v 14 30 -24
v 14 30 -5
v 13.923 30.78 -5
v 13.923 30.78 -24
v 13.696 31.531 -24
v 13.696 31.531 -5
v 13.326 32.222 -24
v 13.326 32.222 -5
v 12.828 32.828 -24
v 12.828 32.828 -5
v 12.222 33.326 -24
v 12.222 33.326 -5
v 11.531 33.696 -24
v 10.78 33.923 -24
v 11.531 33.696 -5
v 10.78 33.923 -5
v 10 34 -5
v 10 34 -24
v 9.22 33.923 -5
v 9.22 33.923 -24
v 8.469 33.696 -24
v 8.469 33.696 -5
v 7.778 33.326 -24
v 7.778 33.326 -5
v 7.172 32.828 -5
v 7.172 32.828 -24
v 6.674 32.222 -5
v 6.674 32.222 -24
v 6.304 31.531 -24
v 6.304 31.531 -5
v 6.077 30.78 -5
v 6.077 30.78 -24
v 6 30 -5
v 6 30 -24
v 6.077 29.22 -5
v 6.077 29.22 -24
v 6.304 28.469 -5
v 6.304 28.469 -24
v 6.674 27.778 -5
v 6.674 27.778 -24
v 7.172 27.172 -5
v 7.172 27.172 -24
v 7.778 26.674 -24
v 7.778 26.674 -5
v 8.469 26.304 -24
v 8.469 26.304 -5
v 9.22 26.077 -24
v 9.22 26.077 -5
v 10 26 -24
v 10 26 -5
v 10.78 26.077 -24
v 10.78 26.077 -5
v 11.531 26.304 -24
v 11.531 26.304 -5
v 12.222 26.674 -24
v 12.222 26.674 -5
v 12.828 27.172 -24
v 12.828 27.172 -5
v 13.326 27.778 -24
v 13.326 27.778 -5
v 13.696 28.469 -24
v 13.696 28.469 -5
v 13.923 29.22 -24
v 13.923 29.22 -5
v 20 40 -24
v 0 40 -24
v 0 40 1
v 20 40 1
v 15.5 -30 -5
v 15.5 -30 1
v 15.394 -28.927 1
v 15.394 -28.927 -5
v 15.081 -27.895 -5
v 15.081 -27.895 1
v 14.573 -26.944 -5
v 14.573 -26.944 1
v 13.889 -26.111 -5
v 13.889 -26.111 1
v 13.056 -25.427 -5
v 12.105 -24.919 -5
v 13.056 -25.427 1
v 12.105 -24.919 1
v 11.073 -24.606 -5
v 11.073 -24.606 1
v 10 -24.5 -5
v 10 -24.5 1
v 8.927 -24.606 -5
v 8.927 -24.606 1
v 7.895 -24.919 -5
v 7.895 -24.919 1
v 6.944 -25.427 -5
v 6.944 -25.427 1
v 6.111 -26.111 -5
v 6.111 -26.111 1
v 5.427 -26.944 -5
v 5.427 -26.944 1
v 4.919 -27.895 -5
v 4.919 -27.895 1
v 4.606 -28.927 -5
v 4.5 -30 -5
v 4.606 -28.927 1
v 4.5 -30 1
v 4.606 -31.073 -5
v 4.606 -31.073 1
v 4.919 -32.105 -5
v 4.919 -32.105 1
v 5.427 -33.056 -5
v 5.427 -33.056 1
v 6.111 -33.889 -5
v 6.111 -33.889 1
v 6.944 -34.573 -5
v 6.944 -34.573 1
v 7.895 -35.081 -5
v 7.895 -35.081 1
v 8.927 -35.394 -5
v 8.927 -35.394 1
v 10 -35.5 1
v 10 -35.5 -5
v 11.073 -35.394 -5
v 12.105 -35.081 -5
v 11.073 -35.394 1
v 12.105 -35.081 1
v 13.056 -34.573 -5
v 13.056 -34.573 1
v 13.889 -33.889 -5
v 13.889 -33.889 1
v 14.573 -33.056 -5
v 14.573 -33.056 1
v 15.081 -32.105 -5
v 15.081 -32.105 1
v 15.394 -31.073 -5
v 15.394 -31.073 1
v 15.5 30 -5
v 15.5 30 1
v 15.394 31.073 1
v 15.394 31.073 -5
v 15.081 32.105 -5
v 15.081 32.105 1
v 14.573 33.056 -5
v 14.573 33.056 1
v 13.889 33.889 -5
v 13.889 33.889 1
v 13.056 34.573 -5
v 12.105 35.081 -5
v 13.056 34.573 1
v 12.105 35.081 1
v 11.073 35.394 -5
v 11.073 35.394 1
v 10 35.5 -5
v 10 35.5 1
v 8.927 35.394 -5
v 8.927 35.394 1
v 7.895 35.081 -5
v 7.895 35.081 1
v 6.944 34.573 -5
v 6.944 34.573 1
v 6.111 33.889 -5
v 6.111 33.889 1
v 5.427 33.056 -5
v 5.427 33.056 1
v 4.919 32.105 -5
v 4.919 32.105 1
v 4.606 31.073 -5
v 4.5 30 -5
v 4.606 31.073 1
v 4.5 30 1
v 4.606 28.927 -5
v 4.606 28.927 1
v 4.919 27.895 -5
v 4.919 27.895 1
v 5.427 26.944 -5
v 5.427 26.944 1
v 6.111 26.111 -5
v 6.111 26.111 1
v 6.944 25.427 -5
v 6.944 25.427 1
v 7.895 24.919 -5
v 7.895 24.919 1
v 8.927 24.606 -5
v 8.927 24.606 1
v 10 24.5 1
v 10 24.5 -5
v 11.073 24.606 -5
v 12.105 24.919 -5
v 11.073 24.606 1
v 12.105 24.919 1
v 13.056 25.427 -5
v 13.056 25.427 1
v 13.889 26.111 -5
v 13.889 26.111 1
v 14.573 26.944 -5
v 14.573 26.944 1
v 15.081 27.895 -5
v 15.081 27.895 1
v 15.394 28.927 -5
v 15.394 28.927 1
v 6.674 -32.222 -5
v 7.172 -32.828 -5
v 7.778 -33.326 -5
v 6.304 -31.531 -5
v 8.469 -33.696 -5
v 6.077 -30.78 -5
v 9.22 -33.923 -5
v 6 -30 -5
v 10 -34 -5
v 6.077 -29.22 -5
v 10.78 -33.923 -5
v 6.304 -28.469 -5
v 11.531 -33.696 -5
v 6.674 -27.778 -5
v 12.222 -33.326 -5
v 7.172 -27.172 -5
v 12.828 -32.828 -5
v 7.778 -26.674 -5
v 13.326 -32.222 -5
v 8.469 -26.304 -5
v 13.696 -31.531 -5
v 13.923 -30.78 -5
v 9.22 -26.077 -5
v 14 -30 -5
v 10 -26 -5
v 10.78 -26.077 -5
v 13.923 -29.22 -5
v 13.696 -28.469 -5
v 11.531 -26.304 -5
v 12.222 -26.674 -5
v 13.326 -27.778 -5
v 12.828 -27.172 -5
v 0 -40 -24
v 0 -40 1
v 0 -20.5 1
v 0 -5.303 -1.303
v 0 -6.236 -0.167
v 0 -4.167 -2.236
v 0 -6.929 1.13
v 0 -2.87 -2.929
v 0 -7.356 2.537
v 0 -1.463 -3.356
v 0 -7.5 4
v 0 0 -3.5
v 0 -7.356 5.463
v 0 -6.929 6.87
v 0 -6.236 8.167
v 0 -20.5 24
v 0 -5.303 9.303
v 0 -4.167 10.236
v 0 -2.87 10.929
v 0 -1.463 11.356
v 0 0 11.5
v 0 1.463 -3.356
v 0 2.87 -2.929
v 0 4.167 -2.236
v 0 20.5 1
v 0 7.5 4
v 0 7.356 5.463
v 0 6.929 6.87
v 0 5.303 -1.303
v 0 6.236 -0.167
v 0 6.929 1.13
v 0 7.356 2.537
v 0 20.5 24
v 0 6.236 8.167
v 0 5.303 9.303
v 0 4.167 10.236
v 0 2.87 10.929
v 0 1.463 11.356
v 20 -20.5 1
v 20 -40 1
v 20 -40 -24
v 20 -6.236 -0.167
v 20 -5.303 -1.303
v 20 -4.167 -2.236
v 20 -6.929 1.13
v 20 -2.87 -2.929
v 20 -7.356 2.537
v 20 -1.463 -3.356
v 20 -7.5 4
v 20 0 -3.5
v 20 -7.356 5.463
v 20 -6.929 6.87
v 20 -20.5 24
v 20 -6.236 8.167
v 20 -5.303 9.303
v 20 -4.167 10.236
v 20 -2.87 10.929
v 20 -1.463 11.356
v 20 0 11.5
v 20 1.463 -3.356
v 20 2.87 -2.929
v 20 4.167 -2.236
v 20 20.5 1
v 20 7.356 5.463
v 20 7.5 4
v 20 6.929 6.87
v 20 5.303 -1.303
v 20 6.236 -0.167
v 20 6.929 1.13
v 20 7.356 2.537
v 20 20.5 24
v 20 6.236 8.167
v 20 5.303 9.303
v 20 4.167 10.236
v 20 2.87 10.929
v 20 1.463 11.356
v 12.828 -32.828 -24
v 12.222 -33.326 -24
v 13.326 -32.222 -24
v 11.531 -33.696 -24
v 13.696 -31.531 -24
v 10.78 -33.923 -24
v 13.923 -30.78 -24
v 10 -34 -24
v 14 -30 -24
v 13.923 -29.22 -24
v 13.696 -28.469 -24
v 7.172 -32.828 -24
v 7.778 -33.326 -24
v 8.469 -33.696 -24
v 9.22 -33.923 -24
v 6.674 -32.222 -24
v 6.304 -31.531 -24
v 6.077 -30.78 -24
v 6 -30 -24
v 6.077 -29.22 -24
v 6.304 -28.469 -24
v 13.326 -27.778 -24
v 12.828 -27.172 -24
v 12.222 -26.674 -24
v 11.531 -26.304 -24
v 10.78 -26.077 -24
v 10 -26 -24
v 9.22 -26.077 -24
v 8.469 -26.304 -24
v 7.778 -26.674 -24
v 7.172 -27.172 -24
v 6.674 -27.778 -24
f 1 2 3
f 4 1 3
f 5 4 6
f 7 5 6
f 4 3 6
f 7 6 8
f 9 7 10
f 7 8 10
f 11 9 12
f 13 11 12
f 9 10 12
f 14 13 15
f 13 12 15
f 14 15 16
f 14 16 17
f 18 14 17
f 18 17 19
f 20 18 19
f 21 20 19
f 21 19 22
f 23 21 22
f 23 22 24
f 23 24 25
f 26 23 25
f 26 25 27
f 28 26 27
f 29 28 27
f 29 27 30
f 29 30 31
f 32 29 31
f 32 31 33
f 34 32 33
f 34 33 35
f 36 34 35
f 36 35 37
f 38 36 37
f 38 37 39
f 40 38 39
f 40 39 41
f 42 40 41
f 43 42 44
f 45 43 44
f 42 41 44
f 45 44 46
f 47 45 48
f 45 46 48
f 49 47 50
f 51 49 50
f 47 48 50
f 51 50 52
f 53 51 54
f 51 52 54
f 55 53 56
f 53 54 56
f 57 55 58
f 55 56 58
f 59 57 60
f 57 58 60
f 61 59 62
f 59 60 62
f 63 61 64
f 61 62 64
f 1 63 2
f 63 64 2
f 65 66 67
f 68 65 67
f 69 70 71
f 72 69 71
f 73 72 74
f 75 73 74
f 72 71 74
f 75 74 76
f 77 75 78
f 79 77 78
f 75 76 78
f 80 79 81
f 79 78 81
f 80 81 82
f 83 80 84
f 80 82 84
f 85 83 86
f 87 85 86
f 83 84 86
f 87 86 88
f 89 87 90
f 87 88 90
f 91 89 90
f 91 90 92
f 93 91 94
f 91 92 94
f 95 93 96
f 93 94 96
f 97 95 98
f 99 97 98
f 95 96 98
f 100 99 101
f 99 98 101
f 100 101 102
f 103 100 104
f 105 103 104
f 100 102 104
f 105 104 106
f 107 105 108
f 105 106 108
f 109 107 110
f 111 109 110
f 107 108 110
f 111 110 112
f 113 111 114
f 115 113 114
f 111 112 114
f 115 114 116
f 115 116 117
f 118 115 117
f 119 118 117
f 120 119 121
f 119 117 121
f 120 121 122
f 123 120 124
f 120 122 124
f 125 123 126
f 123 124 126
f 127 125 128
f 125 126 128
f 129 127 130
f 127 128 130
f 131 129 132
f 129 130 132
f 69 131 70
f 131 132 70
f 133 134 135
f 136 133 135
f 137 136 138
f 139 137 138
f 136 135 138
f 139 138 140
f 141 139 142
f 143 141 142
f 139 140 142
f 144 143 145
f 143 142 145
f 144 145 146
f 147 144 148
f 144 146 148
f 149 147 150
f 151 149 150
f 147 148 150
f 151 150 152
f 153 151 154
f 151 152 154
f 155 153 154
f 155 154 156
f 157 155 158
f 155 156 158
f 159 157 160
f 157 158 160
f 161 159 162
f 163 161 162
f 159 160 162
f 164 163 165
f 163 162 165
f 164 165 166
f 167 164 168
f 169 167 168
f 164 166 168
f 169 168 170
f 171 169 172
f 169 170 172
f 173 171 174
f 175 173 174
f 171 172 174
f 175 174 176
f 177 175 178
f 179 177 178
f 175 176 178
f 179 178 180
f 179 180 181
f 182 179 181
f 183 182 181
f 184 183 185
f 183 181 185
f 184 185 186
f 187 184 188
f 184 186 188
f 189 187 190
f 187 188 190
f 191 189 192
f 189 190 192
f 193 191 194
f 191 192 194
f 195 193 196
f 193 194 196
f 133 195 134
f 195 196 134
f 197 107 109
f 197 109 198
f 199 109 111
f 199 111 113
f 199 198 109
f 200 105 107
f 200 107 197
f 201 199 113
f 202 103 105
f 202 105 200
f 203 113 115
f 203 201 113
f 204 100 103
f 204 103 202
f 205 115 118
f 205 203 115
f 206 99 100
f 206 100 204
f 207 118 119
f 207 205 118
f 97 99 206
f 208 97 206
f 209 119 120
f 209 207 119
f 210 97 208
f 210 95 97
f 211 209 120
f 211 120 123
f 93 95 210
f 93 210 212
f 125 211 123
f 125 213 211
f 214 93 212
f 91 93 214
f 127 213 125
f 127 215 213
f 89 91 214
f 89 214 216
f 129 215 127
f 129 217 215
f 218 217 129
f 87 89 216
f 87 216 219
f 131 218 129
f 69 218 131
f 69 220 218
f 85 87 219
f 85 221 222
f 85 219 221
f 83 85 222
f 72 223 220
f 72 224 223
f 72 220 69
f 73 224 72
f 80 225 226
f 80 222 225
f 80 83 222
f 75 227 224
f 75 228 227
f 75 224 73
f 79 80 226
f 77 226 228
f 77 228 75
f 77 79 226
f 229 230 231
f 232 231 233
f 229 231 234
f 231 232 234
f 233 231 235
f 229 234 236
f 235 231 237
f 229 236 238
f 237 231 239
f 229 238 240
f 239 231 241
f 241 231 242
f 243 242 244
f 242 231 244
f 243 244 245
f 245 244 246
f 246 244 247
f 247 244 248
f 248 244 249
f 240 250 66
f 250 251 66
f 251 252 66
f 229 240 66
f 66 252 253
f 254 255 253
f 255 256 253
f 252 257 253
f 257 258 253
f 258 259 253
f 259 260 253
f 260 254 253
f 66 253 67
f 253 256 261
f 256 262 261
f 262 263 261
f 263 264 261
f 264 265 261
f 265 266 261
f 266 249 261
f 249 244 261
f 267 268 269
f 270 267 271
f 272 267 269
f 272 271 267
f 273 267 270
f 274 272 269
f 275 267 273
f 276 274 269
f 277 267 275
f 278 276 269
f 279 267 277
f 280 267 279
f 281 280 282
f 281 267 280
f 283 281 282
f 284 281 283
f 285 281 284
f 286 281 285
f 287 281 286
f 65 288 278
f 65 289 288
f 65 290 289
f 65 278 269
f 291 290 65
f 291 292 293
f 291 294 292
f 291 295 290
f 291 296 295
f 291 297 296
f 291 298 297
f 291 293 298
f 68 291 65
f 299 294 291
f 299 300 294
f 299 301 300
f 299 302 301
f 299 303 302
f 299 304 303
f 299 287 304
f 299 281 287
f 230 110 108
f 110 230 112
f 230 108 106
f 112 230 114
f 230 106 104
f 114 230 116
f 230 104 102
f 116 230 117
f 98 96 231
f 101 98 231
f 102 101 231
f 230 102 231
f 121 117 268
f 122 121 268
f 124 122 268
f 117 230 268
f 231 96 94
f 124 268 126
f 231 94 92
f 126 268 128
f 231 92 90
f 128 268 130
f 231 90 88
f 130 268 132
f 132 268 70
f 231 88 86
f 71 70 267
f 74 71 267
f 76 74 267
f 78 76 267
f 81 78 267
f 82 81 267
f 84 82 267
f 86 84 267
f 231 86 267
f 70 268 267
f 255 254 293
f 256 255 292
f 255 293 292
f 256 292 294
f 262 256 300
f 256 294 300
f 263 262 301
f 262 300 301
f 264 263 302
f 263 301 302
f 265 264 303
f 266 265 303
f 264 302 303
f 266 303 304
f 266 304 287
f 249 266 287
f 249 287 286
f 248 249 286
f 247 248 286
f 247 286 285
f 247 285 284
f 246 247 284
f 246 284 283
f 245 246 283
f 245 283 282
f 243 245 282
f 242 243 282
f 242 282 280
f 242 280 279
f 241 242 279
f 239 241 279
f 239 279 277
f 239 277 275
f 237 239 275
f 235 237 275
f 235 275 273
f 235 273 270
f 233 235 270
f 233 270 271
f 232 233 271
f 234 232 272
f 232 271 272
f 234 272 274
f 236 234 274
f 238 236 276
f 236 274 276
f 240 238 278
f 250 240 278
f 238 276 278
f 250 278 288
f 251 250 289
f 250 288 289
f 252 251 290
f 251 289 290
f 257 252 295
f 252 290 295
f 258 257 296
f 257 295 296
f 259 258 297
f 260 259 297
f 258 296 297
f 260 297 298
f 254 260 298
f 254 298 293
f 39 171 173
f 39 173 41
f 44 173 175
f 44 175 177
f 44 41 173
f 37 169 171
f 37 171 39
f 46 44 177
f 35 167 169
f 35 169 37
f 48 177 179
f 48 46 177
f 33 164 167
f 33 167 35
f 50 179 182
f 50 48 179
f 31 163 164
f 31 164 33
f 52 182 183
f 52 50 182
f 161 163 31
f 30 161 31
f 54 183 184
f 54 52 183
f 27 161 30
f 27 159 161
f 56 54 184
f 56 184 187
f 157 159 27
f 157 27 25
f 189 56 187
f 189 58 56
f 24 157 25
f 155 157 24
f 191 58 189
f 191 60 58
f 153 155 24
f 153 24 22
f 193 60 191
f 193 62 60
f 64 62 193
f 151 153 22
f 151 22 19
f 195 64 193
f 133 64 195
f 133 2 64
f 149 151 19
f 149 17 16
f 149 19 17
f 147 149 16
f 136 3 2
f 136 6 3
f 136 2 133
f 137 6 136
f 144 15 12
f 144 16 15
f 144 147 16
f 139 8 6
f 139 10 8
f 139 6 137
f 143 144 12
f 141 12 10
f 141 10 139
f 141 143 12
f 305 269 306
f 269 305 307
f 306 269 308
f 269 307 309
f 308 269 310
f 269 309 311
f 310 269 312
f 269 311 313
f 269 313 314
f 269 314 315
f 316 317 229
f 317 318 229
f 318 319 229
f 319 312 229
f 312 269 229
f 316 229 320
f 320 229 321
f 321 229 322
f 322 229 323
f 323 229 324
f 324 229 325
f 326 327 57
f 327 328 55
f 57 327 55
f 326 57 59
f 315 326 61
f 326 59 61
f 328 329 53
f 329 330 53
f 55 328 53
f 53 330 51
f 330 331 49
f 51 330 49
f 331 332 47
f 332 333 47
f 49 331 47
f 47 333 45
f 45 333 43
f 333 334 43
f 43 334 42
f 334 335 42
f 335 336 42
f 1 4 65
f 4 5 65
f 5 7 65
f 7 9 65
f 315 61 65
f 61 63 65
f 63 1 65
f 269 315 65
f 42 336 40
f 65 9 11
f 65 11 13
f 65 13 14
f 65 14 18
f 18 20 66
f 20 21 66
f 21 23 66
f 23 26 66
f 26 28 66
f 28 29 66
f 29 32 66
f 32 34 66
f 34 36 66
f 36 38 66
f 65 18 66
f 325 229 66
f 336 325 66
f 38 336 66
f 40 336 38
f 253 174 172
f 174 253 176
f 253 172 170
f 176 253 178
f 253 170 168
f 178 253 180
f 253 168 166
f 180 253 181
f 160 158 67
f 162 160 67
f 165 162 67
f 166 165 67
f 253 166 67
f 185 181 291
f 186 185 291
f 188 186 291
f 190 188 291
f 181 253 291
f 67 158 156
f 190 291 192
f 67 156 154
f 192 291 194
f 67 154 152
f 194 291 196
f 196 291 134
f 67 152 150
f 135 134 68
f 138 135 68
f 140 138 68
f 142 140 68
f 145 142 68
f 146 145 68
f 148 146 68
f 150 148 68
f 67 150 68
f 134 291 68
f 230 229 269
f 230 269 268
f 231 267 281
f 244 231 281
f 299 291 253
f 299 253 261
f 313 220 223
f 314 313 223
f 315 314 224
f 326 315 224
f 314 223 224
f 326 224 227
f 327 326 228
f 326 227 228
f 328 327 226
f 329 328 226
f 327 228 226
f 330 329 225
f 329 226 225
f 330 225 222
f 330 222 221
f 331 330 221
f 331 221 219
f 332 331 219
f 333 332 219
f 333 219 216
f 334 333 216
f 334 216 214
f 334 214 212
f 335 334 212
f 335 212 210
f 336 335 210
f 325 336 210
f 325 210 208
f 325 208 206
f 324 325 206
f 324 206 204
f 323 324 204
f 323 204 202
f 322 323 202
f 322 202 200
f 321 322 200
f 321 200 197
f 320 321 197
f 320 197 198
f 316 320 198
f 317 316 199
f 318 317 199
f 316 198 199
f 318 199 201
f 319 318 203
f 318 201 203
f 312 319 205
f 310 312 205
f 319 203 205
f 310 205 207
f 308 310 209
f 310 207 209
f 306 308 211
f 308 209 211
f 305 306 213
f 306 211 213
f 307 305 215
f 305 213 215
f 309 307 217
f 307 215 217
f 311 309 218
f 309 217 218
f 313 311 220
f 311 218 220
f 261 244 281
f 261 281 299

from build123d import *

# Parameters (mm, degrees)
F0_W     = 80
F0_H     = 48
F1_DEPTH = 20
F2_R     = 7.5
F3_DEPTH = 20.001
F4_W     = 19.5
F4_H     = 23
F5_DEPTH = 20.001
F6_R     = 5.5
F6_R_2   = 4
F7_DEPTH = 6
F8_DEPTH = 25.001


with BuildPart() as f1:
    # F0 (on Right) → F1 (new body)
    with BuildSketch(Plane.YZ):
        Rectangle(F0_W, F0_H)
    extrude(amount=F1_DEPTH)

    # F2 (on face) → F3 (cut, through all)
    with BuildSketch(Plane.YZ.offset(20)):
        with Locations((0, 4)):
            Circle(F2_R)
    extrude(amount=-F3_DEPTH, mode=Mode.SUBTRACT)

    # F4 (on face) → F5 (cut, through all)
    with BuildSketch(Plane.YZ.offset(20)):
        with Locations((-30.25, 12.5)):
            Rectangle(F4_W, F4_H)
        with Locations((30.25, 12.5)):
            Rectangle(F4_W, F4_H)
    extrude(amount=-F5_DEPTH, mode=Mode.SUBTRACT)

    # F6 (on face) → F7 (cut)
    with BuildSketch(Plane.XY.offset(1)):
        with Locations((10, 30)):
            Circle(F6_R)
        with Locations((10, 30)):
            Circle(F6_R_2, mode=Mode.SUBTRACT)
        with Locations((10, -30)):
            Circle(F6_R)
        with Locations((10, -30)):
            Circle(F6_R_2, mode=Mode.SUBTRACT)
    extrude(amount=-F7_DEPTH, mode=Mode.SUBTRACT)

    # F8 (cut, through all): faces of the model
    f8_faces = [f1.faces().sort_by_distance(p)[0] for p in [
        (10, 30, 1),
        (10, -30, 1),
    ]]
    extrude(f8_faces, amount=-F8_DEPTH, mode=Mode.SUBTRACT)


solid = f1.part
